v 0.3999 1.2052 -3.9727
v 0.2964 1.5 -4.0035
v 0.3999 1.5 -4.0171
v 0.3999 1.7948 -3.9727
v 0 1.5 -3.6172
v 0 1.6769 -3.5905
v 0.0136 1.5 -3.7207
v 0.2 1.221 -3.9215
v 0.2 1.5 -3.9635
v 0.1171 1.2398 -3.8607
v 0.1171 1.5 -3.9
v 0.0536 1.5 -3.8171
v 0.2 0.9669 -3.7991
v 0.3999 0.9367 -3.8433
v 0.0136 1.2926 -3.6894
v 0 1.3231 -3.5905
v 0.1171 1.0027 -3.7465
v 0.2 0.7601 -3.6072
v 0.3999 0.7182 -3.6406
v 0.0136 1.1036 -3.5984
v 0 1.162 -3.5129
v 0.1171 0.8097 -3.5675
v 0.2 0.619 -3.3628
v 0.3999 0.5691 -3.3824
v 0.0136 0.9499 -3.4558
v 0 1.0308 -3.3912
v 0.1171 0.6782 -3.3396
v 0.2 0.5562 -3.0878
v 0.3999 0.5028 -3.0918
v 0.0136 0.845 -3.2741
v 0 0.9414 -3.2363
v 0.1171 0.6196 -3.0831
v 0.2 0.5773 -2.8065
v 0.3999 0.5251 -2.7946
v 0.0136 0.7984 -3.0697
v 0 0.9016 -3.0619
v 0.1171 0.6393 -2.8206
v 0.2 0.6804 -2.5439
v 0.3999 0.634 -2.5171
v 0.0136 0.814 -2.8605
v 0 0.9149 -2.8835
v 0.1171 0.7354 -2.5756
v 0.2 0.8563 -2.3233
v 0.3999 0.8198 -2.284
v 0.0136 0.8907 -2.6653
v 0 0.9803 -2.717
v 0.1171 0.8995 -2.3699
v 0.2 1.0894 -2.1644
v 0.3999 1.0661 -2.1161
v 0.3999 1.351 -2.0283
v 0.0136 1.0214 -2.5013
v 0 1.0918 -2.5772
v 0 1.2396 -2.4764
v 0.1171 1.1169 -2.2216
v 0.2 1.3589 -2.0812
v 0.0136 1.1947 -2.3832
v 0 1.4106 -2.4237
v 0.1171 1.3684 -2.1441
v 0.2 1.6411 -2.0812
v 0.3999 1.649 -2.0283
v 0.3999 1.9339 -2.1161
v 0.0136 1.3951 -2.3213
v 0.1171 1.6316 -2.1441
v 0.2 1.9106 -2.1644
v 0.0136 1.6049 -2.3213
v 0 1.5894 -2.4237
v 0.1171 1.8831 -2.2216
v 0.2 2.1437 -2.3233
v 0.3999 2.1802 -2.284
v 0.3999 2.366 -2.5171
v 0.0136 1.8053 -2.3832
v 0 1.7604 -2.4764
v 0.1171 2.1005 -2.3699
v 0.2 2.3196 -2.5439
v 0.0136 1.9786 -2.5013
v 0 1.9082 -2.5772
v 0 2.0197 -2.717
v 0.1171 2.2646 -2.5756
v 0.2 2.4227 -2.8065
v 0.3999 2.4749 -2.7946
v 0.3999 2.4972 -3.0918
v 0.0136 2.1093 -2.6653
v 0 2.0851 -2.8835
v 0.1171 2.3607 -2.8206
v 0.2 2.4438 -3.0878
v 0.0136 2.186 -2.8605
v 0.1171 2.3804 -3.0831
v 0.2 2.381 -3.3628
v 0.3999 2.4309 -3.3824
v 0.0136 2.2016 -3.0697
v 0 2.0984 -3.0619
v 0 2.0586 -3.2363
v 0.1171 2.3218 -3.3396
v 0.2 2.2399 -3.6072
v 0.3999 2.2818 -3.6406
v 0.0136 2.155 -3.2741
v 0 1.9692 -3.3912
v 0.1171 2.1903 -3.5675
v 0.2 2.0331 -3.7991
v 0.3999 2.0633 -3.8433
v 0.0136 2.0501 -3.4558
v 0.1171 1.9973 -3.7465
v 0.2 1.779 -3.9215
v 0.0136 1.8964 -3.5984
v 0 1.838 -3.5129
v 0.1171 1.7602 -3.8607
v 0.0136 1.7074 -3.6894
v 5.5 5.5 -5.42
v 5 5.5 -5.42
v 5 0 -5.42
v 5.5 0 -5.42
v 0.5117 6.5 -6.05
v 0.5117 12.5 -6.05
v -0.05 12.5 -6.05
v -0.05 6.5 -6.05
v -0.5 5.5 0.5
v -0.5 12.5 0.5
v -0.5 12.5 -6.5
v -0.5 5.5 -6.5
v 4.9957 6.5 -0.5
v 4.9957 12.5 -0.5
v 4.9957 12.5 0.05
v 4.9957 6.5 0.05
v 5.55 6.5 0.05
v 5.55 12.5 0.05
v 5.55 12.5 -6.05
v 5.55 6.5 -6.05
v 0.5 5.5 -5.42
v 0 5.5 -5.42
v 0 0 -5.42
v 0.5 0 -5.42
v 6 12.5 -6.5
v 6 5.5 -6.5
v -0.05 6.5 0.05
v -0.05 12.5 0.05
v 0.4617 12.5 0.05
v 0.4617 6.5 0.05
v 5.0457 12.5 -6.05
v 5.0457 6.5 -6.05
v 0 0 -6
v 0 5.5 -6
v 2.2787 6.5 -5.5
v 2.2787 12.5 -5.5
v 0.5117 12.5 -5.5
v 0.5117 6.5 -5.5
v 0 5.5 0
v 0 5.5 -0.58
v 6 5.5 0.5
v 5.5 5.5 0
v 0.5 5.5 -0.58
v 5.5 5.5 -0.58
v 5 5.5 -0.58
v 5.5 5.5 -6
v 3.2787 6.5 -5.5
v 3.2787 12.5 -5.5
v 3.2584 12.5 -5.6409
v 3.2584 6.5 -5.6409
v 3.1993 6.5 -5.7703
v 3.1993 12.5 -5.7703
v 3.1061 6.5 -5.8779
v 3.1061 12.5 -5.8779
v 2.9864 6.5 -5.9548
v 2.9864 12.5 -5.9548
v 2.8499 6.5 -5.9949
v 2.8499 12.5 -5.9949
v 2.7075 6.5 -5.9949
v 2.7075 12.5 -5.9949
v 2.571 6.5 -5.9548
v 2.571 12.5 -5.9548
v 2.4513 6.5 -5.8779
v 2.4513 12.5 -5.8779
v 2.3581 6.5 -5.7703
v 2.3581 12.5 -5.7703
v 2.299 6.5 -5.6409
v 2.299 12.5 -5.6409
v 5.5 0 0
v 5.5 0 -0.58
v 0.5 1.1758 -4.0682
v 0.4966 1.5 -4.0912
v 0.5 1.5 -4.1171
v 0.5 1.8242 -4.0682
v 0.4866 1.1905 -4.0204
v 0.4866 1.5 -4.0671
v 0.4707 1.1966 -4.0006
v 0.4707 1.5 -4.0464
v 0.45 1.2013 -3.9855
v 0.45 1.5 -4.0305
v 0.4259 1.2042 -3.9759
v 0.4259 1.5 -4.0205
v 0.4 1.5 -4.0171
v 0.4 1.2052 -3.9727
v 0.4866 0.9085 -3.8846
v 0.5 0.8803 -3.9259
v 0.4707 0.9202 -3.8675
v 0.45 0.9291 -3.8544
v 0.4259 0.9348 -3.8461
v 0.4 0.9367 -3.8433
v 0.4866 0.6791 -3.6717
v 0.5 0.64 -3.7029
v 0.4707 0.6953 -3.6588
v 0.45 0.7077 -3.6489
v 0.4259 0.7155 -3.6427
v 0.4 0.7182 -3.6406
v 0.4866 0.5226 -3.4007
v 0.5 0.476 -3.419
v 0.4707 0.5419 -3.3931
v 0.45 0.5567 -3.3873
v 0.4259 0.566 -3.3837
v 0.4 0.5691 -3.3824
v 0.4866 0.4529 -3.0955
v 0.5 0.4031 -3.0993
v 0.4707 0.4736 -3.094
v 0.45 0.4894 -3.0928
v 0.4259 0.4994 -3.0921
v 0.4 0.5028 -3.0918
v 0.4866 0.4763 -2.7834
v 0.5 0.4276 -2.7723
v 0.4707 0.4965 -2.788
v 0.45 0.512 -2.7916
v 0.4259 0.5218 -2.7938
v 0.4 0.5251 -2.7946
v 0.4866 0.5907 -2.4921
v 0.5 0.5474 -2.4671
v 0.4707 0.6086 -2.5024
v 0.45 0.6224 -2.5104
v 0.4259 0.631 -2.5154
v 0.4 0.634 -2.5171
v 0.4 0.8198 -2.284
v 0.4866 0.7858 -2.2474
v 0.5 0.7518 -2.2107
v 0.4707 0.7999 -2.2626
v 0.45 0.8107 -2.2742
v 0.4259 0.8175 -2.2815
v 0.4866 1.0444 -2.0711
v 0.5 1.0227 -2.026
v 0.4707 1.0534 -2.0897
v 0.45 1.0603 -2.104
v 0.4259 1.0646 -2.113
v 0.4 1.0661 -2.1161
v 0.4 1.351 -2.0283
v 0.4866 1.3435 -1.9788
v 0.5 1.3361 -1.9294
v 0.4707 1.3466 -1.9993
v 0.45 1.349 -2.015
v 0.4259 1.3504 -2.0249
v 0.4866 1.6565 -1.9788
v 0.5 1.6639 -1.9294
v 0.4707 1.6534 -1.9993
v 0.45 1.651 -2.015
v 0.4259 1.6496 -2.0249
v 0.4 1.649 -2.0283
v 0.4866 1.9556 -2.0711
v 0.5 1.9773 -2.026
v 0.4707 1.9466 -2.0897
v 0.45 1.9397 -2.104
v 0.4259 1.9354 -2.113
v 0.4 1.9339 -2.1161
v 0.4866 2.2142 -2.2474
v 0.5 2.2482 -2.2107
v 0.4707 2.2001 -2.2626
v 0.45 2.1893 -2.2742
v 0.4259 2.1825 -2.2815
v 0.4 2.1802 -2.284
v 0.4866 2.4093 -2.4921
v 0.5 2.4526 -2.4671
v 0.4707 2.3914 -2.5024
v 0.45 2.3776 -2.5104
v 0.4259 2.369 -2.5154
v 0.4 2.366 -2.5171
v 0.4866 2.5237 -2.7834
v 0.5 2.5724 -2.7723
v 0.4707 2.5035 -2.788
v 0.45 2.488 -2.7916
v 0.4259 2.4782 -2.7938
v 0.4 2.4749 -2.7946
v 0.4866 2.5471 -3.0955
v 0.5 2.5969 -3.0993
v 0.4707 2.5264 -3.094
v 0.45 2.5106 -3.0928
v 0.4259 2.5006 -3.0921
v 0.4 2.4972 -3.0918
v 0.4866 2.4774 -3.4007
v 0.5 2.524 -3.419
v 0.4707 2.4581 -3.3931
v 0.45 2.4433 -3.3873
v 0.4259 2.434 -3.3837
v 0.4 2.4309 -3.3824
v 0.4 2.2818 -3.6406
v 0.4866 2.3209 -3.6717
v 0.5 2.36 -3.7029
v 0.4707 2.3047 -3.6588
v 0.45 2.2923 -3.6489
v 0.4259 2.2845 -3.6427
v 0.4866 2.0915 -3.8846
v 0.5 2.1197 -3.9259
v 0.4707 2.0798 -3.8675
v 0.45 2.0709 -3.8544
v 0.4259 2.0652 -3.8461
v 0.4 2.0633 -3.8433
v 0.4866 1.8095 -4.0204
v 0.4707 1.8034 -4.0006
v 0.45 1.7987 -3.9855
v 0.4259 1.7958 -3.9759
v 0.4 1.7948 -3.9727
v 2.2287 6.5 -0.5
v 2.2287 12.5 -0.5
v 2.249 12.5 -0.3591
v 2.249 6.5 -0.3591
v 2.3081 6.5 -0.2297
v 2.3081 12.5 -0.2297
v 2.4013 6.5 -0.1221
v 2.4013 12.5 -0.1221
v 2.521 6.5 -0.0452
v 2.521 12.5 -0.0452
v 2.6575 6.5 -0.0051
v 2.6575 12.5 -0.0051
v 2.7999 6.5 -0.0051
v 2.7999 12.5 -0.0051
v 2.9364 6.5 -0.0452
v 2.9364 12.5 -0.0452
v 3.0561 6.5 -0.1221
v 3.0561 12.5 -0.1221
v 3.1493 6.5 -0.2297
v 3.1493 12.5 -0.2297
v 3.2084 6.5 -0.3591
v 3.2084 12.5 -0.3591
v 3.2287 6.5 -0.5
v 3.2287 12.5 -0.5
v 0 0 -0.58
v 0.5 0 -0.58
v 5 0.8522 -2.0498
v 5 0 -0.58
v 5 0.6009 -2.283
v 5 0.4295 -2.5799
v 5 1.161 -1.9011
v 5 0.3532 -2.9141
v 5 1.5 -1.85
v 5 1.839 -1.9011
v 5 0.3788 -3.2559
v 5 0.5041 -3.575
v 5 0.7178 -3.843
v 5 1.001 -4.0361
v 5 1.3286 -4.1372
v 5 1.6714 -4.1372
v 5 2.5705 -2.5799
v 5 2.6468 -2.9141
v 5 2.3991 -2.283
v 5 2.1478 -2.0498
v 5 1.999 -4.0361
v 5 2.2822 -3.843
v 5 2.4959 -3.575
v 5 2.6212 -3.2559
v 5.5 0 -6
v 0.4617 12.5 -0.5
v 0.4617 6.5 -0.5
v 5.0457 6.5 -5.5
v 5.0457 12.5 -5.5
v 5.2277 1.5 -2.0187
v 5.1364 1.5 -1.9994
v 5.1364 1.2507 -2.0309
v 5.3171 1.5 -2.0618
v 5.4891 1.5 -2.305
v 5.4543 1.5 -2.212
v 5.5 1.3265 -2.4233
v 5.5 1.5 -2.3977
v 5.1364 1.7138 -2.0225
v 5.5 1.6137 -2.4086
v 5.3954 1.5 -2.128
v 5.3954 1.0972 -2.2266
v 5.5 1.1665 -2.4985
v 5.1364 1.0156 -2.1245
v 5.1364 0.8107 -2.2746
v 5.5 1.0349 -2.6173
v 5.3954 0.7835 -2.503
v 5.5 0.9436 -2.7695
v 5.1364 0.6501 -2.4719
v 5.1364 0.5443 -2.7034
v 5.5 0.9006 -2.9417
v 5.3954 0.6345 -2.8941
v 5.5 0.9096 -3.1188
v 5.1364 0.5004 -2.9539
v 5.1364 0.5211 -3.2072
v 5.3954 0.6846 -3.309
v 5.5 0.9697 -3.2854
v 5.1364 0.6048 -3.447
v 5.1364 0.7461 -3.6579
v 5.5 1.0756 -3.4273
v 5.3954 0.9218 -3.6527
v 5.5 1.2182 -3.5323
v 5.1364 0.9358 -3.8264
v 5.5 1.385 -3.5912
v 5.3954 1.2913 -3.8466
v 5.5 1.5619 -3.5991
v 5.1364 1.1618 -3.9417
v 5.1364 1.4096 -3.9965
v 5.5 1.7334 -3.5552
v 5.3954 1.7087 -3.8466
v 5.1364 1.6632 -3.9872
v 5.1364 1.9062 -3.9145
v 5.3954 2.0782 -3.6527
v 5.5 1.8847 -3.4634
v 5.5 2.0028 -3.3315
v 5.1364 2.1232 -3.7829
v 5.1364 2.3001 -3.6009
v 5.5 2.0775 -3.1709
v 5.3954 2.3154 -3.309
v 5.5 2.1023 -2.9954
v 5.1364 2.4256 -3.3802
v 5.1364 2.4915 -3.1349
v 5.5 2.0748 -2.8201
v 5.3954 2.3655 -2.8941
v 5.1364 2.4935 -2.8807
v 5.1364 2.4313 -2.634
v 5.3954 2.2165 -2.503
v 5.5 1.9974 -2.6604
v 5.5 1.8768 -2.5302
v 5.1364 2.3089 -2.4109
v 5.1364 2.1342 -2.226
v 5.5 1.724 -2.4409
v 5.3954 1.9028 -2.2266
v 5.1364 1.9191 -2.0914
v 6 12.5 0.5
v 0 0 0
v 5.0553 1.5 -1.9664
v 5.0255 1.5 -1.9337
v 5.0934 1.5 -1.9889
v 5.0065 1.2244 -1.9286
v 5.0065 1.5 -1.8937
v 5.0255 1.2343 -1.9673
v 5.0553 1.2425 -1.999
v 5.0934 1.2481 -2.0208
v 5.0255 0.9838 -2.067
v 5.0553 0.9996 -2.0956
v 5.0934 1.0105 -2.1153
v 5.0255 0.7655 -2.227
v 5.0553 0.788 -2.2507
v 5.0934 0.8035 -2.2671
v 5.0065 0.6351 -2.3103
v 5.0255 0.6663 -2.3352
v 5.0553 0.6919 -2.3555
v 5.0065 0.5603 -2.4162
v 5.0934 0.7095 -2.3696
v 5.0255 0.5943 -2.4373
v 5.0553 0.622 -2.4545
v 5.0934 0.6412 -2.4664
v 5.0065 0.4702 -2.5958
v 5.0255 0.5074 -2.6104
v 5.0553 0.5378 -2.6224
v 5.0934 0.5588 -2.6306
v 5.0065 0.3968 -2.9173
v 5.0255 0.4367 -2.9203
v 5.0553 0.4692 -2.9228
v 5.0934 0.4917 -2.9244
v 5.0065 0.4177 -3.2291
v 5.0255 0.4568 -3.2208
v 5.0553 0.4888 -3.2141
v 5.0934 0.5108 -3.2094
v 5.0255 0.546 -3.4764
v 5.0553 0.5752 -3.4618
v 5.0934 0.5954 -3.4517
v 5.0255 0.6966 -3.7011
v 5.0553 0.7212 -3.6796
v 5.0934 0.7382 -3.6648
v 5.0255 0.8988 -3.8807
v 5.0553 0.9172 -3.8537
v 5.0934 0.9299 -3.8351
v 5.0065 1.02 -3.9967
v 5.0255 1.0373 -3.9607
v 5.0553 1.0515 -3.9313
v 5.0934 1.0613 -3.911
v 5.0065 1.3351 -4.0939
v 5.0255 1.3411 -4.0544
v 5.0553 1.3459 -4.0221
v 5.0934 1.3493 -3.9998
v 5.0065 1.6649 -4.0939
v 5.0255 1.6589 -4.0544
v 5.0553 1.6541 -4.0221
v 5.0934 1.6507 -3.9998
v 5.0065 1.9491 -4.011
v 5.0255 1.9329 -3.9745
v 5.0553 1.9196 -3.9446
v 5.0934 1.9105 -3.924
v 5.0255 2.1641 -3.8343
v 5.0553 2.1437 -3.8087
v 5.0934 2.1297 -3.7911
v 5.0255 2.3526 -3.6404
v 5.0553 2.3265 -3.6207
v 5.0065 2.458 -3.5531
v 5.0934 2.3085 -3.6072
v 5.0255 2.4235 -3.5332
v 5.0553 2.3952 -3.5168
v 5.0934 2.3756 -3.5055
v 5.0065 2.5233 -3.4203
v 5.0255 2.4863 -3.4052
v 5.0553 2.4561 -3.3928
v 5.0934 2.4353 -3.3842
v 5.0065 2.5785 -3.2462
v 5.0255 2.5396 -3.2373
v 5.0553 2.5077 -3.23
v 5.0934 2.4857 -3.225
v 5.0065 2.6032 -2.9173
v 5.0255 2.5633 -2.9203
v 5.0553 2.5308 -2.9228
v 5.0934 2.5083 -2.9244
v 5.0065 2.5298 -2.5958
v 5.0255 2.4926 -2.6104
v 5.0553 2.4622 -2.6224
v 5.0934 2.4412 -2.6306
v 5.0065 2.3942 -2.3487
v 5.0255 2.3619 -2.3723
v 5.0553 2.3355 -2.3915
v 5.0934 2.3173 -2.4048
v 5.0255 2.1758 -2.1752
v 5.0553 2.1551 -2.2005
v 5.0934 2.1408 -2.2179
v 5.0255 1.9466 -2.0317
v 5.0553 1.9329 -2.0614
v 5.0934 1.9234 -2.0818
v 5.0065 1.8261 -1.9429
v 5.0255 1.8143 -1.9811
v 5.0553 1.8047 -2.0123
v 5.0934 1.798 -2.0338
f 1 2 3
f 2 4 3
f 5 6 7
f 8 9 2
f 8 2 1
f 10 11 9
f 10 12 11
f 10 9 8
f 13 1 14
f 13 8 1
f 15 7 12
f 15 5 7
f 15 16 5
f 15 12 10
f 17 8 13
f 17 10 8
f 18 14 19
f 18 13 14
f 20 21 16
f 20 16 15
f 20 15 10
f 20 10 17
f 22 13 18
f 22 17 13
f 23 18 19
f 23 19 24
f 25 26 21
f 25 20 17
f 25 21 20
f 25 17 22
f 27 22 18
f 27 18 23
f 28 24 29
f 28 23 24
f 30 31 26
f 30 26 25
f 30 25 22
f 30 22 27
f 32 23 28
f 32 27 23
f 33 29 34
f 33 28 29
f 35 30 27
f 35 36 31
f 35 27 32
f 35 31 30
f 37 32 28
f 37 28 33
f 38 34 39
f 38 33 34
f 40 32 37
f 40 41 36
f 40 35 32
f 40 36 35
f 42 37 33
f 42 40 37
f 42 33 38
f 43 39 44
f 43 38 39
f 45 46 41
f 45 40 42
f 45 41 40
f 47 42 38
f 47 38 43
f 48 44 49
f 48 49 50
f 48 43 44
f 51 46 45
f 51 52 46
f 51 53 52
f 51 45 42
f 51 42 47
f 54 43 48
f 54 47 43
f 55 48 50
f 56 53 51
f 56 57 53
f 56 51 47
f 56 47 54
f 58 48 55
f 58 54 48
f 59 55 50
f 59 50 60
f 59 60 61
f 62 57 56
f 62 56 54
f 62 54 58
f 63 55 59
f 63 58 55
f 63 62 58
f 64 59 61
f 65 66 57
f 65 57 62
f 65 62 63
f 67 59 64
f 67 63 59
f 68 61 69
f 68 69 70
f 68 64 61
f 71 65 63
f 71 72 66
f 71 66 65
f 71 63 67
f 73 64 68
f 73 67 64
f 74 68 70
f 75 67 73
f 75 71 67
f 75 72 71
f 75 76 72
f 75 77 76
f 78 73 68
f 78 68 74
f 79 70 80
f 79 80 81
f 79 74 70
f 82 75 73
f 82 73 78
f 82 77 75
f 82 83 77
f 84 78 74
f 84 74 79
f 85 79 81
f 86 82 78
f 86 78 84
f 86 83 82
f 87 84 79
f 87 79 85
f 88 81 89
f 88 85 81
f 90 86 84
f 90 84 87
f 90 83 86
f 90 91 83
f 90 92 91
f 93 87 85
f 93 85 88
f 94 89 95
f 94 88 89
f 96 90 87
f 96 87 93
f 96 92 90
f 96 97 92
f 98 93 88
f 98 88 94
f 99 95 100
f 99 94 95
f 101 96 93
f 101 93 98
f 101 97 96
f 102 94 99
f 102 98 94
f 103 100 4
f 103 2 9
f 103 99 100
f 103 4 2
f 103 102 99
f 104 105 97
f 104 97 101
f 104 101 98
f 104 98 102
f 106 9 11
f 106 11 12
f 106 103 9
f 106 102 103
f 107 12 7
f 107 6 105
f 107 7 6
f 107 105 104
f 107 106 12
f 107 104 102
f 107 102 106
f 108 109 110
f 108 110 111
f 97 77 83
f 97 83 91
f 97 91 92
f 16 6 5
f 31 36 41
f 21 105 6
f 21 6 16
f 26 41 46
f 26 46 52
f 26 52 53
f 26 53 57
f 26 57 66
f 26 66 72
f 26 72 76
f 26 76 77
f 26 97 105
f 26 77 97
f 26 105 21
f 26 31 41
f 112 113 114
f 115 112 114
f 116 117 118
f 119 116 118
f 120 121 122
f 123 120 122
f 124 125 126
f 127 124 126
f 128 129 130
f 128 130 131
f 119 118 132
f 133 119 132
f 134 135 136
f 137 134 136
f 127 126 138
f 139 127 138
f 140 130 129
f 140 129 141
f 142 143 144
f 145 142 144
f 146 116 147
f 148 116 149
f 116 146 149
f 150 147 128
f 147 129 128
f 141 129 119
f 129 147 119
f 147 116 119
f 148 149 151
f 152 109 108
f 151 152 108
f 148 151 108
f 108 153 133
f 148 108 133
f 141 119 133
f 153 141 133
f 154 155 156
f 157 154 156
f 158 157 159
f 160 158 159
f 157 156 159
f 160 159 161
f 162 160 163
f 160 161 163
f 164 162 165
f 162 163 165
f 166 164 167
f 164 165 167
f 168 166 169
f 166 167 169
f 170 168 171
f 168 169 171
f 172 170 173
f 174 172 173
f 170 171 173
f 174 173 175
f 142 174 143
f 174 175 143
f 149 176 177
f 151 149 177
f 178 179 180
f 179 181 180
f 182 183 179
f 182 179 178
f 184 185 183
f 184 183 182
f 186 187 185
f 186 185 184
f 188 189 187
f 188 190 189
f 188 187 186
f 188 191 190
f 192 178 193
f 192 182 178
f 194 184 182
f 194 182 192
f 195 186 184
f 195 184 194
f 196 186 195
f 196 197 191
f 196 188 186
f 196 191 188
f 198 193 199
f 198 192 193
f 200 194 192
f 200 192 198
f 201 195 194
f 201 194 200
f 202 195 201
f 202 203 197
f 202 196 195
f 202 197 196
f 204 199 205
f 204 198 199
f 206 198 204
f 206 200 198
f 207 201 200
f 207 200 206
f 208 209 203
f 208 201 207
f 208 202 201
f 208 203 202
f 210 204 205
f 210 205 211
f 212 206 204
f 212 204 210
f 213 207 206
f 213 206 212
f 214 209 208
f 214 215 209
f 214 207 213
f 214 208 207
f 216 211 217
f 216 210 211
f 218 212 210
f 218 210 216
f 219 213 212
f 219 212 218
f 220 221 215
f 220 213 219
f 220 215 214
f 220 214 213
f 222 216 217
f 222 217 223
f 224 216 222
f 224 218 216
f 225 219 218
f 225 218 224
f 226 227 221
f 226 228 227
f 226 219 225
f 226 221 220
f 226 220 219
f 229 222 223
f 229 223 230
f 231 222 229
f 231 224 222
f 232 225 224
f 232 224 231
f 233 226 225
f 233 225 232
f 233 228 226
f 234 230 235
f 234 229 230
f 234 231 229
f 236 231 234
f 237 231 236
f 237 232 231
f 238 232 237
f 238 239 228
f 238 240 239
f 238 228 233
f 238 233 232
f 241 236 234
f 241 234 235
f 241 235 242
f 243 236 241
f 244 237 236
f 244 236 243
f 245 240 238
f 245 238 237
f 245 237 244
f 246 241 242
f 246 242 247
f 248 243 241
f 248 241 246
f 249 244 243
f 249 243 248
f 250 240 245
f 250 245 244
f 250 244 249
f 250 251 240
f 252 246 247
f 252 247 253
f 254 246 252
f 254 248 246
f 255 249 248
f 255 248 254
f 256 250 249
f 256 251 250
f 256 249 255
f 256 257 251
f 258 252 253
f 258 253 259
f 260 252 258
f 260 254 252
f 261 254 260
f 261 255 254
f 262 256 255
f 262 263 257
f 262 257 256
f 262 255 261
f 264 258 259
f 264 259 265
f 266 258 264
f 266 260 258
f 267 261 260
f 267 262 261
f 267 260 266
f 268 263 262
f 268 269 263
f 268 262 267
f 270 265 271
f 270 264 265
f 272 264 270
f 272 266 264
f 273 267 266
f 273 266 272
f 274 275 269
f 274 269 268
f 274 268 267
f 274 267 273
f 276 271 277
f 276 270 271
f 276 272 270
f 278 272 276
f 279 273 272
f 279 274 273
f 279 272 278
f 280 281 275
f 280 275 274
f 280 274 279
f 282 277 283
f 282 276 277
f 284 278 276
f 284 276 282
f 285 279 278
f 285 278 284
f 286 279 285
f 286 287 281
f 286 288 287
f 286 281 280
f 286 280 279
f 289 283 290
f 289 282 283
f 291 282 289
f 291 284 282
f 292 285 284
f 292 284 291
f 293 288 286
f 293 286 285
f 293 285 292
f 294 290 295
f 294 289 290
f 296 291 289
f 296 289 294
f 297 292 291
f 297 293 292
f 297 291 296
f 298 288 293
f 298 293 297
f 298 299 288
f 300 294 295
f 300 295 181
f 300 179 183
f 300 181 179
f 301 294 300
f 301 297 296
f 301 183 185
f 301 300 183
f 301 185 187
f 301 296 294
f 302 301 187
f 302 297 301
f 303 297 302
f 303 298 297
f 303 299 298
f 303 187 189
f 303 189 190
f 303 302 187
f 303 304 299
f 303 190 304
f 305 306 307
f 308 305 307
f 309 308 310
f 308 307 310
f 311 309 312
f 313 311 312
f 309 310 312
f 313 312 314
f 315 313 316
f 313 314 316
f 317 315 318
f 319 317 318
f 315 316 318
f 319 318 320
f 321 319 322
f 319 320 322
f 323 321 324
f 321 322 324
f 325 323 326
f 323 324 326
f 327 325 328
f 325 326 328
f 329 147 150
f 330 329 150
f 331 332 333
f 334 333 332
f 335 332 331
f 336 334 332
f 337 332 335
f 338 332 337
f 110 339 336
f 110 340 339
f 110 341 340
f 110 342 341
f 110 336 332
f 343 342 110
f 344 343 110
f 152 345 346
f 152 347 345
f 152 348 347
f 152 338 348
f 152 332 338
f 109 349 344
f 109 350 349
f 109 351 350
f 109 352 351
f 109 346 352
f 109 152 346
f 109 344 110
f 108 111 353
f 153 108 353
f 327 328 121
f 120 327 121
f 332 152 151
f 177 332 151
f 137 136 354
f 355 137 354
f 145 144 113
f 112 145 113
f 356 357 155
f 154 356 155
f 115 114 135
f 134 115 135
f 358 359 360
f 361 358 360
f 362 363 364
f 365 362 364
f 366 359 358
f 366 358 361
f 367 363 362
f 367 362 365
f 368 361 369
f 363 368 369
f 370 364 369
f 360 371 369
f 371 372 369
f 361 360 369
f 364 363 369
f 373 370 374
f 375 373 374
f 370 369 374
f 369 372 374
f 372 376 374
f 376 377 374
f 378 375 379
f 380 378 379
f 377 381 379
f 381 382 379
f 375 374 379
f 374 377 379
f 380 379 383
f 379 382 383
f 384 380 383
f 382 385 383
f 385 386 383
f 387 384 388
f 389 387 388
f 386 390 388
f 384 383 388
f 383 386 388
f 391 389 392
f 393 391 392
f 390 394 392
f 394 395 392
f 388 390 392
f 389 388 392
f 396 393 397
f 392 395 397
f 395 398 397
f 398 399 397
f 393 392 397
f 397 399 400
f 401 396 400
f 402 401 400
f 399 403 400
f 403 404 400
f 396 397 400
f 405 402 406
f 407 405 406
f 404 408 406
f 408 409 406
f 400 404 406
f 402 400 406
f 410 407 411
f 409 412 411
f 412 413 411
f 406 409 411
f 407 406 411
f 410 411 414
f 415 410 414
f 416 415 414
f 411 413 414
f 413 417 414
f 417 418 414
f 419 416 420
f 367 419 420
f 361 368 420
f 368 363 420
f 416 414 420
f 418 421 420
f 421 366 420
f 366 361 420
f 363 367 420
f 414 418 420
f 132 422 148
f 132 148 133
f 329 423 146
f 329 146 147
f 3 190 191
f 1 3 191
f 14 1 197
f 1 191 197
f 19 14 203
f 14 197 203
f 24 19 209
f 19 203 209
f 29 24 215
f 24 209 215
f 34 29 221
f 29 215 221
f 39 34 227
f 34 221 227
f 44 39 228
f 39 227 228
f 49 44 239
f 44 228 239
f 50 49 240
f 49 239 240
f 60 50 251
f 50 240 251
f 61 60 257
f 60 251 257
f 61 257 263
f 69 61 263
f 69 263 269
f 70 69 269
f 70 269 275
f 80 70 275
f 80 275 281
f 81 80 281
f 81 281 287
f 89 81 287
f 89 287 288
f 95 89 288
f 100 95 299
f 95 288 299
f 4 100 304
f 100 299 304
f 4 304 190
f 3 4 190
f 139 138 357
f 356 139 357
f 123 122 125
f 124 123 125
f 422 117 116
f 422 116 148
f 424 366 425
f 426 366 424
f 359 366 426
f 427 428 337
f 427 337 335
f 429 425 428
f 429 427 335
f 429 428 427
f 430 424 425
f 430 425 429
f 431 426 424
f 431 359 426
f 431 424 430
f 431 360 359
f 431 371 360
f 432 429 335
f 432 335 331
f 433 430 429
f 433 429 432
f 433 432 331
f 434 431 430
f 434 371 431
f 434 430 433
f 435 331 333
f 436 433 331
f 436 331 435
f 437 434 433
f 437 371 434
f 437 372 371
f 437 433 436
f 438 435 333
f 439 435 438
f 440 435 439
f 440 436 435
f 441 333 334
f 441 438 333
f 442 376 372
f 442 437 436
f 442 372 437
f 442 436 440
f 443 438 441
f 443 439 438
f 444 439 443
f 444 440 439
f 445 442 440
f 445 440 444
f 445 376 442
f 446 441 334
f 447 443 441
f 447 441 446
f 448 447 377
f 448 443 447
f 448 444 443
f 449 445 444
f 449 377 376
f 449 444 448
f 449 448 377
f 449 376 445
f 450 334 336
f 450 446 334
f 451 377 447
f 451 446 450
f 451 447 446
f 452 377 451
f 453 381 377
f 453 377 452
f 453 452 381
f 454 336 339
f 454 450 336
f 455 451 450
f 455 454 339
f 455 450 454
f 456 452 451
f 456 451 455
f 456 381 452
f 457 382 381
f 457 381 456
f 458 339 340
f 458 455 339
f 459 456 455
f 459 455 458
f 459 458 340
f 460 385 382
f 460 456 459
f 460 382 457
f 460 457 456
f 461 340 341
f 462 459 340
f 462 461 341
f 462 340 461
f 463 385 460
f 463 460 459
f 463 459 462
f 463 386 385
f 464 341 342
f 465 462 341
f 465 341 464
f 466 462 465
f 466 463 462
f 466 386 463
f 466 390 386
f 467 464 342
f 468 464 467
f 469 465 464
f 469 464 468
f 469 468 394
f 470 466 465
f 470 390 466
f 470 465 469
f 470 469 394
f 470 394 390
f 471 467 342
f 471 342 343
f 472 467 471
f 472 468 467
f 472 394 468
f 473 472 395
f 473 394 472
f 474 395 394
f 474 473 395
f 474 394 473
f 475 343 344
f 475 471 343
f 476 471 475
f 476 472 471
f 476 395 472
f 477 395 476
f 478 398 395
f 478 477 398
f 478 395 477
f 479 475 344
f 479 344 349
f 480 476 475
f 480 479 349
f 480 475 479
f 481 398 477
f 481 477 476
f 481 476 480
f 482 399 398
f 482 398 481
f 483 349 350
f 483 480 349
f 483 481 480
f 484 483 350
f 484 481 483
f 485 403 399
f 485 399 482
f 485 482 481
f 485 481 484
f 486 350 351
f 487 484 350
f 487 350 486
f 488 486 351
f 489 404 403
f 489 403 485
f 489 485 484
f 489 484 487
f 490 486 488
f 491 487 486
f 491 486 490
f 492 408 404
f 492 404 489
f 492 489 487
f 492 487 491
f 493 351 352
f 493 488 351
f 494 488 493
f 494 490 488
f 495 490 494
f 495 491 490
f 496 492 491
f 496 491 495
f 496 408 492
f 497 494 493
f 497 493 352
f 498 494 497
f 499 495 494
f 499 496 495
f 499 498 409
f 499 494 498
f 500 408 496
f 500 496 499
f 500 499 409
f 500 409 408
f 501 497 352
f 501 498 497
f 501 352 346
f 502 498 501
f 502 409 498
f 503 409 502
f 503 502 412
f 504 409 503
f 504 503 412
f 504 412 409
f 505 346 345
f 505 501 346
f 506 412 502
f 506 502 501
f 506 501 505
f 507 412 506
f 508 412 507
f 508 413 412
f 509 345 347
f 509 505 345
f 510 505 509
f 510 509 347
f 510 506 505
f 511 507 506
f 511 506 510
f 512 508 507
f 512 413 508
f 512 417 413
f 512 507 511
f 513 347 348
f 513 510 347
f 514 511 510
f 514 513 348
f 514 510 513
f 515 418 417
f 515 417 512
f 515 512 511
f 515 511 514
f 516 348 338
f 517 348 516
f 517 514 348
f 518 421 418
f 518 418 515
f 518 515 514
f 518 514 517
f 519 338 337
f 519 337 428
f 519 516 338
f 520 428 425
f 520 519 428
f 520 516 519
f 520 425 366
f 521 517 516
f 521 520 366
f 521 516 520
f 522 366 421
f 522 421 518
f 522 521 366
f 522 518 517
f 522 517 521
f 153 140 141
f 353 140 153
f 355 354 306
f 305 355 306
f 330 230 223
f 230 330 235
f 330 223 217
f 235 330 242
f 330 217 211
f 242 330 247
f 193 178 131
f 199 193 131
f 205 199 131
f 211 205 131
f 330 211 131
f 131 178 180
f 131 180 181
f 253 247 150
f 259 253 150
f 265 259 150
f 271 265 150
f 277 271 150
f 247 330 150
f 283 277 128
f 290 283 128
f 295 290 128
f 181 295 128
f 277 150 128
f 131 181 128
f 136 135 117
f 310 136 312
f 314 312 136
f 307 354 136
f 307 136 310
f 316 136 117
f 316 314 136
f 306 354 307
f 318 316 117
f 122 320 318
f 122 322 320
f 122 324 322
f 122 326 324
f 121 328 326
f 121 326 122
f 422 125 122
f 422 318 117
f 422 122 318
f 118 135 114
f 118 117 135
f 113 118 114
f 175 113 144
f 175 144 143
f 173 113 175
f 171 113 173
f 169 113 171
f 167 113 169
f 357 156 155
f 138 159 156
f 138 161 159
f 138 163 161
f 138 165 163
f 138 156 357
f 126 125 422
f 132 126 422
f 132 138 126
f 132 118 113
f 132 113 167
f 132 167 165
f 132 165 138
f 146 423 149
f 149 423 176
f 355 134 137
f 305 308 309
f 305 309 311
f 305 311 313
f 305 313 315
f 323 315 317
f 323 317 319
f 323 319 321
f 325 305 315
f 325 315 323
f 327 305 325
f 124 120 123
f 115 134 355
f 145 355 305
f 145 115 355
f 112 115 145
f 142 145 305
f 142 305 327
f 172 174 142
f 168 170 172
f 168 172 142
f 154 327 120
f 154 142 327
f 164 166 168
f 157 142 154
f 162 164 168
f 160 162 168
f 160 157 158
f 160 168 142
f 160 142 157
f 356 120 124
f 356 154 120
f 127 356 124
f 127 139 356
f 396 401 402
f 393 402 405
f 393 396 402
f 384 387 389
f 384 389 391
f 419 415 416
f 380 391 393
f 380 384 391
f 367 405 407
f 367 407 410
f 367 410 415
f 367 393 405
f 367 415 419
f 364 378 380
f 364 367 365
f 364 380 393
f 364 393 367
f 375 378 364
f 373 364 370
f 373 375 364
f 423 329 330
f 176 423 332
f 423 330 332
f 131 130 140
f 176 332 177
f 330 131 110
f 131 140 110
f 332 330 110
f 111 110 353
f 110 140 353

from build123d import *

# Parameters (mm, degrees)
SKETCH1_W           = 5.5
SKETCH1_H           = 6
BOSS_EXTRUDE1_DEPTH = 12.5
SKETCH2_W           = 0.5
SKETCH2_H           = 4.84
CUT_EXTRUDE1_DEPTH  = 12.5
SKETCH3_R           = 1
BOSS_EXTRUDE2_DEPTH = 0.5
FILLET1_R           = 0.15
FILLET2_R           = 0.4
SKETCH4_R           = 1
BOSS_EXTRUDE3_DEPTH = 0.5
FILLET3_R           = 0.1
FILLET4_R           = 0.4
SKETCH5_W           = 6.5
SKETCH5_H           = 7
BOSS_EXTRUDE5_DEPTH = 7
CUT_EXTRUDE4_DEPTH  = 6
SKETCH8_R           = 0.5
CUT_EXTRUDE5_DEPTH  = 6


with BuildPart() as part:
    # Sketch1 → Boss-Extrude1 (new body)
    with BuildSketch(Plane(origin=(0, 0, 0), x_dir=(1, 0, 0), z_dir=(0, 1, 0))):
        with Locations((2.75, 3)):
            Rectangle(SKETCH1_W, SKETCH1_H)
    extrude(amount=BOSS_EXTRUDE1_DEPTH)

    # Sketch2 → Cut-Extrude1 (cut)
    with BuildSketch(Plane(origin=(0, 12.5, 0), x_dir=(1, 0, 0), z_dir=(0, 1, 0))):
        with Locations((0.25, 3)):
            Rectangle(SKETCH2_W, SKETCH2_H)
        with Locations((5.25, 3)):
            Rectangle(SKETCH2_W, SKETCH2_H)
    extrude(amount=-CUT_EXTRUDE1_DEPTH, mode=Mode.SUBTRACT)

    # Sketch3 → Boss-Extrude2 (add)
    with BuildSketch(Plane(origin=(5, 0, 0), x_dir=(0, 0, -1), z_dir=(1, 0, 0))):
        with Locations(Location((3, 1.5, 0), (0, 0, 180))):
            Circle(SKETCH3_R)
    extrude(amount=BOSS_EXTRUDE2_DEPTH)

    # Fillet1
    fillet1_edges = [part.edges().sort_by_distance(p)[0] for p in [
        (5, 1.5, -4),
    ]]
    fillet(fillet1_edges, radius=FILLET1_R)

    # Fillet2
    fillet2_edges = [part.edges().sort_by_distance(p)[0] for p in [
        (5.5, 1.5, -4),
    ]]
    fillet(fillet2_edges, radius=FILLET2_R)

    # Sketch4 → Boss-Extrude3 (add)
    with BuildSketch(Plane.ZY.offset(-0.5)):
        with Locations(Location((-3.017081324, 1.5, 0), (0, 0, 180))):
            Circle(SKETCH4_R)
    extrude(amount=BOSS_EXTRUDE3_DEPTH)

    # Fillet3
    fillet3_edges = [part.edges().sort_by_distance(p)[0] for p in [
        (0.5, 1.5, -2.017081324),
    ]]
    fillet(fillet3_edges, radius=FILLET3_R)

    # Fillet4
    fillet4_edges = [part.edges().sort_by_distance(p)[0] for p in [
        (0, 1.5, -2.017081324),
    ]]
    fillet(fillet4_edges, radius=FILLET4_R - 0.0001)  # a hair under: the kernel refuses the full size

    # Sketch5 → Boss-Extrude5 (add)
    with BuildSketch(Plane(origin=(0, 12.5, 0), x_dir=(1, 0, 0), z_dir=(0, 1, 0))):
        with Locations((2.75, 3)):
            Rectangle(SKETCH5_W, SKETCH5_H)
    extrude(amount=-BOSS_EXTRUDE5_DEPTH)

    # Sketch7 → Cut-Extrude4 (cut)
    with BuildSketch(Plane(origin=(0, 12.5, 0), x_dir=(1, 0, 0), z_dir=(0, 1, 0))):
        Polygon((-0.05, -0.05), (0.461663349, -0.05), (0.461663349, 0.5), (4.995729898, 0.5), (4.995729898, -0.05), (5.55, -0.05), (5.55, 6.05), (5.045729898, 6.05), (5.045729898, 5.5), (0.511663349, 5.5), (0.511663349, 6.05), (-0.05, 6.05), align=None)
    extrude(amount=-CUT_EXTRUDE4_DEPTH, mode=Mode.SUBTRACT)

    # Sketch8 → Cut-Extrude5 (cut)
    with BuildSketch(Plane(origin=(0, 12.5, 0), x_dir=(1, 0, 0), z_dir=(0, 1, 0))):
        with Locations((2.778696624, 5.5)):
            Circle(SKETCH8_R)
        with Locations((2.728696624, 0.5)):
            Circle(SKETCH8_R)
    extrude(amount=-CUT_EXTRUDE5_DEPTH, mode=Mode.SUBTRACT)


solid = part.part
